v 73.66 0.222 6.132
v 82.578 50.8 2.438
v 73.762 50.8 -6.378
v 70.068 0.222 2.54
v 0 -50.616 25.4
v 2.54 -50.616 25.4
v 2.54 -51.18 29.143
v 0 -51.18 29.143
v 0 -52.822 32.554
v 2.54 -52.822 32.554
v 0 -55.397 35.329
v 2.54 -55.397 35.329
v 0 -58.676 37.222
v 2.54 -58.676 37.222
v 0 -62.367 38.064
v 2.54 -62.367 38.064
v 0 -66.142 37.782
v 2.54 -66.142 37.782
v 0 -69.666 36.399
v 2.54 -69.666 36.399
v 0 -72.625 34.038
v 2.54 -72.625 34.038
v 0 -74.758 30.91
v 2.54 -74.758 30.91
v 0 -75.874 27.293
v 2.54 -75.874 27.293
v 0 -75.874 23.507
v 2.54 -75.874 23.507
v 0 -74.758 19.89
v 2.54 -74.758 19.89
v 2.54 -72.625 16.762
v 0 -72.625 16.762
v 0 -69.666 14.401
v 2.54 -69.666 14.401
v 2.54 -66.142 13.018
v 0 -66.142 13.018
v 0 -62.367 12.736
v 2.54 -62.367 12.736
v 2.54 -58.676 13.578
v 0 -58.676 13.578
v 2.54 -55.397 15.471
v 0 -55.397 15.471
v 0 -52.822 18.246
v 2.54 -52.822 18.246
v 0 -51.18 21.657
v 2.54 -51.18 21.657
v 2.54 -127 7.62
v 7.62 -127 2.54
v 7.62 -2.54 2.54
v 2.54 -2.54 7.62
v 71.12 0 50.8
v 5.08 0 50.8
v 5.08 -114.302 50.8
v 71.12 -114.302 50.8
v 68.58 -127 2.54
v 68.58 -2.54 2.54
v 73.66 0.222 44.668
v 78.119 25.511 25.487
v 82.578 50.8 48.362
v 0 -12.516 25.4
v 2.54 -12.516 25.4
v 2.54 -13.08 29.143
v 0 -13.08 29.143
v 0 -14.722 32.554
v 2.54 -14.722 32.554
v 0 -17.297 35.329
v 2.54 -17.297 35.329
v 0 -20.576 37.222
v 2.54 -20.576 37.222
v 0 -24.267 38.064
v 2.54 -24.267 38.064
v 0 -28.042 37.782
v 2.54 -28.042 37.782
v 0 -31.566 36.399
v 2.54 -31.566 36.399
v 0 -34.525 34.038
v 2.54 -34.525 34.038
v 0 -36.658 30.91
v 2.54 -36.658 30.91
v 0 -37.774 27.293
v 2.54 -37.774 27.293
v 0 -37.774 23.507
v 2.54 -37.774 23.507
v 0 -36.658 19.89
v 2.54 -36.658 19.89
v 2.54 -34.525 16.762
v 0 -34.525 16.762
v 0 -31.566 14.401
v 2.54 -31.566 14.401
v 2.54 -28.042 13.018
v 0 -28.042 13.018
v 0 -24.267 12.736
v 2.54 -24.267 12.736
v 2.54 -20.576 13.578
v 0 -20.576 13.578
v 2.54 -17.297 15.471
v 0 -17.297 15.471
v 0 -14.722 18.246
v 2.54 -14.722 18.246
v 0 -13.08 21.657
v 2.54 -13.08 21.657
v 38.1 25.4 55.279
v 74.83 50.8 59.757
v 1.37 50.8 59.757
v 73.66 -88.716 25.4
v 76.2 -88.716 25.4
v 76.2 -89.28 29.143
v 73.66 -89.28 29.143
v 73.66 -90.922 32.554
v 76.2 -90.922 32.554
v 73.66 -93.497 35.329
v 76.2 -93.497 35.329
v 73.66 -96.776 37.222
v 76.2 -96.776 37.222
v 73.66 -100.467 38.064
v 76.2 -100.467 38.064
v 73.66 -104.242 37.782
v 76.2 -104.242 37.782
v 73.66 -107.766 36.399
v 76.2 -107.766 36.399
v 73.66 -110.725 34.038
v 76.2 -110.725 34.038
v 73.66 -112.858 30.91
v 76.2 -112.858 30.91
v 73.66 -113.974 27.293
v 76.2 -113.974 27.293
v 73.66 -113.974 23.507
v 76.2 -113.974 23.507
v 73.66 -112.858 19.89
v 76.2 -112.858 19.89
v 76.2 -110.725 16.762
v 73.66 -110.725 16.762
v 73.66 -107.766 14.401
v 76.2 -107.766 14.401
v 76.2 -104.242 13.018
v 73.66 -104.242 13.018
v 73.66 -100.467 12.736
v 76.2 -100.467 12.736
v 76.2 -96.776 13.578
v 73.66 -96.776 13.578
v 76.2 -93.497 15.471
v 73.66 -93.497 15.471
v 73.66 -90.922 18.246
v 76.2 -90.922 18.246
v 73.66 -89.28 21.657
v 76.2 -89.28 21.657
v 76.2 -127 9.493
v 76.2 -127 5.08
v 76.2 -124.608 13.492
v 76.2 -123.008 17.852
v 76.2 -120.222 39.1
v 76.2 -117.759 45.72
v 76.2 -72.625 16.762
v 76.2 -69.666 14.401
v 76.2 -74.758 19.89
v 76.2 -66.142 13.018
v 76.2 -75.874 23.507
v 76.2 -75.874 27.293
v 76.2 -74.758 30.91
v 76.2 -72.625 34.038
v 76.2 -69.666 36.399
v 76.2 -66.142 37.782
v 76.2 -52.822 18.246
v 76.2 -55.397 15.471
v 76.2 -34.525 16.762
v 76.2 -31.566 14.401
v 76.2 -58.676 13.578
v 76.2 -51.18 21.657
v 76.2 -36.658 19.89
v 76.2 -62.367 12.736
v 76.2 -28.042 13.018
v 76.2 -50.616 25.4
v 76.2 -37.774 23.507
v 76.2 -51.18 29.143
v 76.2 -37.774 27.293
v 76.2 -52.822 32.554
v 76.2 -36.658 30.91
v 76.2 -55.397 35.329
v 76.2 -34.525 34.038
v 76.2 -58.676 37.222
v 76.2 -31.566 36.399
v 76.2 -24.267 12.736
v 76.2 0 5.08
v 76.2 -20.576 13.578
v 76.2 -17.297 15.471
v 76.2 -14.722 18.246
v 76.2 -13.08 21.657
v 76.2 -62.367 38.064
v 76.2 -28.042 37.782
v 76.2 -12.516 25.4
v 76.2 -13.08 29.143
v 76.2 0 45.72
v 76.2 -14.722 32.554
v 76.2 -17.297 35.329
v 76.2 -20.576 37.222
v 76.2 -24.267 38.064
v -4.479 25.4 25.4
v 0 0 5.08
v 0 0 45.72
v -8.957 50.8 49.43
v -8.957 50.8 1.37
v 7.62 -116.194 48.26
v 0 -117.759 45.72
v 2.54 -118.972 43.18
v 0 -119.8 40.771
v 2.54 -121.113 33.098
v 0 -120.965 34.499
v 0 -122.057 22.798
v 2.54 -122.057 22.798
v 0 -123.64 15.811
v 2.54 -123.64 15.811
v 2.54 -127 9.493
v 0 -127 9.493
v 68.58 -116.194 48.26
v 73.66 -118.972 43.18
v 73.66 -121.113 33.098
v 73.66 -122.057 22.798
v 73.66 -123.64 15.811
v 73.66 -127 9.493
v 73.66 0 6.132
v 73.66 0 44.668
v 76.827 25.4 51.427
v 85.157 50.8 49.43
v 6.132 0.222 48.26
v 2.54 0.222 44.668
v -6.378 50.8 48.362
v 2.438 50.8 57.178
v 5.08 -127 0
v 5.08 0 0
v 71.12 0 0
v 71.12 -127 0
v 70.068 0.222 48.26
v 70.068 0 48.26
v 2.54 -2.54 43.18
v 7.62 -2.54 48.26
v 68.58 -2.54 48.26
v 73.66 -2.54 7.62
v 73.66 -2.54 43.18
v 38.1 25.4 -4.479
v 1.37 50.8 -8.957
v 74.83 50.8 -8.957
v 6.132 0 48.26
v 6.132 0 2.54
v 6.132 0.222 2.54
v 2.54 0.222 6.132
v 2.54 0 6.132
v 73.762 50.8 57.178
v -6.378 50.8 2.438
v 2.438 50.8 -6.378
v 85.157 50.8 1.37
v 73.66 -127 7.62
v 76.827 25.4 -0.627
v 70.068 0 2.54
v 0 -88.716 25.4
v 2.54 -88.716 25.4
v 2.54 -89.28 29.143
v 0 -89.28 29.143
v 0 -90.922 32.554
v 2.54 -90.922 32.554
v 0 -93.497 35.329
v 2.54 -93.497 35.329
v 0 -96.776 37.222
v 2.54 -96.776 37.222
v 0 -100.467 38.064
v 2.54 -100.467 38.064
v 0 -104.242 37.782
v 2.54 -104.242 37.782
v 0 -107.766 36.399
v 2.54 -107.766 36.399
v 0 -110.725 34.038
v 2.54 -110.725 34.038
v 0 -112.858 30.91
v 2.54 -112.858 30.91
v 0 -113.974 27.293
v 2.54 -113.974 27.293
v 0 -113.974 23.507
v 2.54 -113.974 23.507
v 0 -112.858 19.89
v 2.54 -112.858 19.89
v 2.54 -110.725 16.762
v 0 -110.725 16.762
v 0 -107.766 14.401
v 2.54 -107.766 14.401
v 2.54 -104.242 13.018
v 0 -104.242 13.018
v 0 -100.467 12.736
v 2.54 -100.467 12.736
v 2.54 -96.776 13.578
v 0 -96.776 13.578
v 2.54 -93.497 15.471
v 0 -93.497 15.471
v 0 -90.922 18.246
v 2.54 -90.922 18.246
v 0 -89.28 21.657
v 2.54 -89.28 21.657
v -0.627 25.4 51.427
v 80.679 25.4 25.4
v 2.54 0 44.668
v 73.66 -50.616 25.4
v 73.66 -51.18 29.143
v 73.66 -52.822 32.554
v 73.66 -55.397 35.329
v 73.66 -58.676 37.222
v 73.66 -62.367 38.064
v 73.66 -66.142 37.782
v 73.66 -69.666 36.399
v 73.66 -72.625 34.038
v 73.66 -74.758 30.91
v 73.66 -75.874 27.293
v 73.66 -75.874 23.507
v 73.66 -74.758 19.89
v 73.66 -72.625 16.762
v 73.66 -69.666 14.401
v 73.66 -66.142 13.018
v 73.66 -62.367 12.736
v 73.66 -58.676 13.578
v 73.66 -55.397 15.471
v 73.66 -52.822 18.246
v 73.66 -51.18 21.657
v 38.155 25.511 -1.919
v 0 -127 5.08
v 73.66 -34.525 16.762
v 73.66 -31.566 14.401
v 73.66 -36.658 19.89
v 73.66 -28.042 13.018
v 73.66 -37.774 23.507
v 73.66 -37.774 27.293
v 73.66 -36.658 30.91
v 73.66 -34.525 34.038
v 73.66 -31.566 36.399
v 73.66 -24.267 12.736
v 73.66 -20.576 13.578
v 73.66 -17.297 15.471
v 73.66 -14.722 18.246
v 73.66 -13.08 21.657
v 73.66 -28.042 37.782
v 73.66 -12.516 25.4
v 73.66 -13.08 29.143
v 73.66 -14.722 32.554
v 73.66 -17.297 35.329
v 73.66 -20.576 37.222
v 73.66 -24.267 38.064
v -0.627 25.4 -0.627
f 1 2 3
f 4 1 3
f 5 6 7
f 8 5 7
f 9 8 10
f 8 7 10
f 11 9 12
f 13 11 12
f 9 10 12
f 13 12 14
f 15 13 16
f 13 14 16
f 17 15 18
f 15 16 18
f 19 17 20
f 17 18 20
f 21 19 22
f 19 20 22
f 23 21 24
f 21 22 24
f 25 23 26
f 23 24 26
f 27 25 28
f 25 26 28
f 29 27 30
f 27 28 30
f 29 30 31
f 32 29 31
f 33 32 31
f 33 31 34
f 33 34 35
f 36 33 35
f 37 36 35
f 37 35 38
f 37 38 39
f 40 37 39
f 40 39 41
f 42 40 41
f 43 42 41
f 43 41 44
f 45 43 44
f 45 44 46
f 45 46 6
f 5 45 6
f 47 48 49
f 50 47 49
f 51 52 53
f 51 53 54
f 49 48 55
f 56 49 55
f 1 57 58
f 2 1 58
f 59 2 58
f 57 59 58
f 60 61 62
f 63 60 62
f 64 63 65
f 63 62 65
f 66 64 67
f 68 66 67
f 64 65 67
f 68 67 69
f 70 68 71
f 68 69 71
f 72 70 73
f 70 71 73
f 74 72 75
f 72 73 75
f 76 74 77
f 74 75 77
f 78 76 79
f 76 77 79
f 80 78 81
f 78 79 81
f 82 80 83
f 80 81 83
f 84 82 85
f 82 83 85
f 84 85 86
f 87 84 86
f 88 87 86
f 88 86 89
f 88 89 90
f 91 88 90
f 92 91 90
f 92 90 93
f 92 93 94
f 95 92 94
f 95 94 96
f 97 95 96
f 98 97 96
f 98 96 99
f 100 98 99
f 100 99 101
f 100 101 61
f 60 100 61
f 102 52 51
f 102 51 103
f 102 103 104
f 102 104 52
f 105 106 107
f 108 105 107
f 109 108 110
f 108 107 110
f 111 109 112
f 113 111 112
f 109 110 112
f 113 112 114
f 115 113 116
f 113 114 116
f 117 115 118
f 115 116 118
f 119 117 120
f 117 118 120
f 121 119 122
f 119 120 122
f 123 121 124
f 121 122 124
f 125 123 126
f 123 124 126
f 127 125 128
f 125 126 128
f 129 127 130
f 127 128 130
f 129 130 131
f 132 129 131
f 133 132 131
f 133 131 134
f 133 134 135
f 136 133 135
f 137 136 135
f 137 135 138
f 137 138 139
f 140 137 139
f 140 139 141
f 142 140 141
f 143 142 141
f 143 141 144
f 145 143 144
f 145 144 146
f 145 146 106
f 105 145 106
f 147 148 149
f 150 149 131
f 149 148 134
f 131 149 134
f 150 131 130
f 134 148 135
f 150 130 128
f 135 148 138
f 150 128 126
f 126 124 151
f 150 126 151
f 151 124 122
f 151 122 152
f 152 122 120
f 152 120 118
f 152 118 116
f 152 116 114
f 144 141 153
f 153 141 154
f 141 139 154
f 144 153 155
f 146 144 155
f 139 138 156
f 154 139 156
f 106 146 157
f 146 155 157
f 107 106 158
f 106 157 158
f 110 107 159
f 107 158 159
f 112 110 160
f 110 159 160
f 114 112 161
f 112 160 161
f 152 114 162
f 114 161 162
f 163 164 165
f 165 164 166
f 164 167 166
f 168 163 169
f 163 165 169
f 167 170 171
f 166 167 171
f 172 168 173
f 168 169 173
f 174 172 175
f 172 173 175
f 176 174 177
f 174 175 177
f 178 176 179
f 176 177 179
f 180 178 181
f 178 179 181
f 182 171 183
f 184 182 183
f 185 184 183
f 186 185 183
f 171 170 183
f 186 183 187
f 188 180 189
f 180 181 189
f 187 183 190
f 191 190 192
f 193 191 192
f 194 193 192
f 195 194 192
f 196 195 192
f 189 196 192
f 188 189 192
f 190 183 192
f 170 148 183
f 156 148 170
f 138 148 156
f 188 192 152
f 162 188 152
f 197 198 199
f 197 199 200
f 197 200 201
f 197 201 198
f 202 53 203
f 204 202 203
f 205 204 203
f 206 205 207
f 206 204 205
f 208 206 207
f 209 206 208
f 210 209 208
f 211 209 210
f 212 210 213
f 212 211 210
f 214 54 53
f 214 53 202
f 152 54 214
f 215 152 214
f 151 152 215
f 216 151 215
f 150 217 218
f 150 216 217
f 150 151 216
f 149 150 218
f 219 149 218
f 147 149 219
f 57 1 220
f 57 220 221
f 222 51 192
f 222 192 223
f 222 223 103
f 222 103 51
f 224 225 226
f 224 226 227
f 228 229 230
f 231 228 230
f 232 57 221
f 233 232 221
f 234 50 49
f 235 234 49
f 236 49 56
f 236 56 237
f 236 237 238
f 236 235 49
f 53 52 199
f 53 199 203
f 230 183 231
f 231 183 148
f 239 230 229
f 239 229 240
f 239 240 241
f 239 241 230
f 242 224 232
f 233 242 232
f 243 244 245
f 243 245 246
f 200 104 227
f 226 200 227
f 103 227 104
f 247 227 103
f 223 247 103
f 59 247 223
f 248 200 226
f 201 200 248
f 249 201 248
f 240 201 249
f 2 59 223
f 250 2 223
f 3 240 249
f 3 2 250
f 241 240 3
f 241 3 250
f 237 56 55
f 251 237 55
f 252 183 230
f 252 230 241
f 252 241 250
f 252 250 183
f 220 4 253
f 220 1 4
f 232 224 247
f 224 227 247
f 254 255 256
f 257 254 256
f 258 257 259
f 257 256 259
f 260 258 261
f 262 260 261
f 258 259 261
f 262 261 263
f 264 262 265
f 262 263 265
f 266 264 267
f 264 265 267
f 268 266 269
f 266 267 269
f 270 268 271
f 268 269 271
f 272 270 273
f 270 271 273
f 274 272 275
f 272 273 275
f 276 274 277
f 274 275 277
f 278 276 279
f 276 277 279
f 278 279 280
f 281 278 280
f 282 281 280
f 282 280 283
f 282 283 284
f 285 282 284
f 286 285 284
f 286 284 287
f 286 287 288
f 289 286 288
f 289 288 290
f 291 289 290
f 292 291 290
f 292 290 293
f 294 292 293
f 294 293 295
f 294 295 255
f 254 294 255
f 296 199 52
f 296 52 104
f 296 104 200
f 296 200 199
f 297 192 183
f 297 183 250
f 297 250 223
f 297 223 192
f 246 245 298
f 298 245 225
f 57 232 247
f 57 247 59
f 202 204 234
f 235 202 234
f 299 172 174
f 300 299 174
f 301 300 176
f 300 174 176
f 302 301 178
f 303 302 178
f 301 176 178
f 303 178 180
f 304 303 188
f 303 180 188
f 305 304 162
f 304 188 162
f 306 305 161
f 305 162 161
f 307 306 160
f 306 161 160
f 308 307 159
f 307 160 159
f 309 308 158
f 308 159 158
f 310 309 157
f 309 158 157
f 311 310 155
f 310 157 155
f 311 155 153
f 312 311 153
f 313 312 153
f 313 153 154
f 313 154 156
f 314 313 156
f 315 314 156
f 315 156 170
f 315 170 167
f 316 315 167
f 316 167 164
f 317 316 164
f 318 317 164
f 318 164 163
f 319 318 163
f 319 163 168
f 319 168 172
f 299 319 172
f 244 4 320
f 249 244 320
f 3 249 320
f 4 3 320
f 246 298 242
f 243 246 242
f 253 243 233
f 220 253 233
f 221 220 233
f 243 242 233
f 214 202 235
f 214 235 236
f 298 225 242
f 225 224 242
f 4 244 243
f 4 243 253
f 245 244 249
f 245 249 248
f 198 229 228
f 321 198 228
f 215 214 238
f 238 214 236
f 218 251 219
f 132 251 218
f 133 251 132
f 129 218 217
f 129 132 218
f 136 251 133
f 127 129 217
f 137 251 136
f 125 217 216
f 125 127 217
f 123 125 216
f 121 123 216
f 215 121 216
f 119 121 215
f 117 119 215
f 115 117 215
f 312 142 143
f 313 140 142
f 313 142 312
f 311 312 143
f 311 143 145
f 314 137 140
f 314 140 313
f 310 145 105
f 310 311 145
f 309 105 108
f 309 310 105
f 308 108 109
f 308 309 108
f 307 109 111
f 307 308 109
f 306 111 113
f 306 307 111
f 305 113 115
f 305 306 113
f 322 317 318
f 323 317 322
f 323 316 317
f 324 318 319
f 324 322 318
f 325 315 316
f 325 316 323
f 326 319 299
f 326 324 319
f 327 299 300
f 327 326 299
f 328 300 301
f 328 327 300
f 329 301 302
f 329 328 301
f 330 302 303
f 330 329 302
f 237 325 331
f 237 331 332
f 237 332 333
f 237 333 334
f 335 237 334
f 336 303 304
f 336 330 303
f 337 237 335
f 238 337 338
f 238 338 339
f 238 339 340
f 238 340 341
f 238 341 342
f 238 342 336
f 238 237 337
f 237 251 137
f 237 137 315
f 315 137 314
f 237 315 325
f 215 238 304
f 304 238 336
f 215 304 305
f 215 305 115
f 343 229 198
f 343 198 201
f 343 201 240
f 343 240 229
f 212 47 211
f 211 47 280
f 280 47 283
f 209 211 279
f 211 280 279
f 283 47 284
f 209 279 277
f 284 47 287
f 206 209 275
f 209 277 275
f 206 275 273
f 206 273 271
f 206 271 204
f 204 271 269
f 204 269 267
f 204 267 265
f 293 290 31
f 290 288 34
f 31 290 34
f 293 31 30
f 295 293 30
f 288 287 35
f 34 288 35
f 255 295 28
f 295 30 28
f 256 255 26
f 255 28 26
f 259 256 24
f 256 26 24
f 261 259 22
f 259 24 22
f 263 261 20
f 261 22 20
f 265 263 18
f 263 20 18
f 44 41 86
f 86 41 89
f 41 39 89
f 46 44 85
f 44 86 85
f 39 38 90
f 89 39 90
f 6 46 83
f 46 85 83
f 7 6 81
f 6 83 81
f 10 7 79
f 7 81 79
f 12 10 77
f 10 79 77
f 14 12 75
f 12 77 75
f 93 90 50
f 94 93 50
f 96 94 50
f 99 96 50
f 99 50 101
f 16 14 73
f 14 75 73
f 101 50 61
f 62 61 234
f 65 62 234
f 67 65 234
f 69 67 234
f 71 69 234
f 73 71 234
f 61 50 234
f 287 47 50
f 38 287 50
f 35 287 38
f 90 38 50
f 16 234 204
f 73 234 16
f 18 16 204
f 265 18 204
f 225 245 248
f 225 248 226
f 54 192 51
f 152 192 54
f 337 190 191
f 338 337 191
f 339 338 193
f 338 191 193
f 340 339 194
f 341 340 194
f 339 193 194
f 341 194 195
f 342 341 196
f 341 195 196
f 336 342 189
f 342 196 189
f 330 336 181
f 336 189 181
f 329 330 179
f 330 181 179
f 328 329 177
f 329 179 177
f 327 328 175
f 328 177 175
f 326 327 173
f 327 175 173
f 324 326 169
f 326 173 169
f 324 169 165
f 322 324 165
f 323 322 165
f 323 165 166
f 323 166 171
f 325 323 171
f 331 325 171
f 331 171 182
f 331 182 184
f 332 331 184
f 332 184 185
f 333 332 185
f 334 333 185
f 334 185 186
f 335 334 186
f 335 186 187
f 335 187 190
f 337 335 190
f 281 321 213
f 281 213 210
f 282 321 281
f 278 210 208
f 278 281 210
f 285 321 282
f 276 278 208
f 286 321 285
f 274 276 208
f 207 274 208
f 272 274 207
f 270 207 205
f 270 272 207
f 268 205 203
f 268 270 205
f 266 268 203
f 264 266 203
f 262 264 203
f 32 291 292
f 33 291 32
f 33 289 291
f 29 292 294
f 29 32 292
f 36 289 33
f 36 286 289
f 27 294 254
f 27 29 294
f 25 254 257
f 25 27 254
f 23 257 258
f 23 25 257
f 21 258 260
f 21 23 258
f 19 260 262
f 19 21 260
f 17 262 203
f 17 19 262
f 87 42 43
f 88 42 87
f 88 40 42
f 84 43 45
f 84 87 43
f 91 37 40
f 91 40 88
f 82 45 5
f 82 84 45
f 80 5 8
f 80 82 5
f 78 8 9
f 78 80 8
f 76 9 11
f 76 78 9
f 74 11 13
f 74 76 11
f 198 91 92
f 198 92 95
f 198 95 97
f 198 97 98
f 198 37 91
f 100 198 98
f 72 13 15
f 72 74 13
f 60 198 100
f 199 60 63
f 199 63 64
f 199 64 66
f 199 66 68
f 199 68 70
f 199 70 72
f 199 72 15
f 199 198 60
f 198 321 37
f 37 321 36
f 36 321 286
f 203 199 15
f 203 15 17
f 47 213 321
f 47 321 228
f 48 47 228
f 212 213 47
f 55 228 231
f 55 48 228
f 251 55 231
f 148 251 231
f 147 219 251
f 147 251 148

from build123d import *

# Parameters (mm, degrees)
F0_W     = 76.2
F0_H     = 50.8
F1_DEPTH = 127
F2_T     = -2.54
F3_R     = 12.7
F4_DEPTH = 76.201
F6_DEPTH = 76.201
F7_SIZE  = 5.08
F9_DEPTH = 50.8
F9_TAPER = -10
F10_T    = -2.54


with BuildPart() as f1:
    # F0 (on Front) → F1 (new body)
    with BuildSketch(Plane.XZ):
        with Locations((38.1, 25.4)):
            Rectangle(F0_W, F0_H)
    extrude(amount=F1_DEPTH)

    # F2
    f2_openings = [f1.faces().sort_by_distance(p)[0] for p in [
        (38.1, -127, 25.4),
    ]]
    offset(amount=F2_T, openings=f2_openings)

    # F3 (on face) → F4 (cut, through all)
    with BuildSketch(Plane.YZ.offset(76.2)):
        with Locations((-101.4156882687, 25.4)):
            Circle(F3_R)
        with Locations((-63.3156882687, 25.4)):
            Circle(F3_R)
        with Locations((-25.2156882687, 25.4)):
            Circle(F3_R)
    extrude(amount=-F4_DEPTH, mode=Mode.SUBTRACT)

    # F5 (on face) → F6 (cut, through all)
    with BuildSketch(Plane.YZ.offset(76.2)):
        with BuildLine():
            add(Edge.make_bspline(
                [(-114.3024048609, 50.8), (-116.3753766316, 48.2180029007), (-122.7739913645, 38.3634851462), (-120.2785073467, 21.2308461151), (-125.5979944732, 11.4326219351), (-127, 9.4929700746)],
                knots=[0.1809579396, 0.1809579396, 0.1809579396, 0.1809579396, 0.3115506916, 0.6462020469, 0.7356568333, 0.7356568333, 0.7356568333, 0.7356568333], degree=3))
            Line((-114.3024048609, 50.8), (-127, 50.8))
            Line((-127, 50.8), (-127, 9.4929700746))
        make_face()
    extrude(amount=-F6_DEPTH, mode=Mode.SUBTRACT)

    # F7
    f7_edges = [f1.edges().sort_by_distance(p)[0] for p in [
        (2.54, -64.77, 2.54),
        (73.66, -64.77, 2.54),
        (2.54, -59.366962, 48.26),
        (73.66, -59.366962, 48.26),
        (0, -57.151202, 50.8),
        (76.2, -57.151202, 50.8),
        (0, -63.5, 0),
        (76.2, -63.5, 0),
    ]]
    chamfer(f7_edges, length=F7_SIZE)

    # F8 (on face) → F9 (join)
    with BuildSketch(Plane(origin=(0, 0, 0), x_dir=(-1, 0, 0), z_dir=(0, 1, 0))):
        Polygon((0, 45.72), (-5.08, 50.8), (-71.12, 50.8), (-76.2, 45.72), (-76.2, 9.4929700837), (-76.2, 5.08), (-71.12, 0), (-5.08, 0), (0, 5.08), align=None)
    extrude(amount=F9_DEPTH, taper=F9_TAPER)

    # F10
    f10_openings = [f1.faces().sort_by_distance(p)[0] for p in [
        (38.1, 50.8, 25.4),
    ]]
    offset(amount=F10_T, openings=f10_openings, kind=Kind.INTERSECTION)


solid = f1.part
